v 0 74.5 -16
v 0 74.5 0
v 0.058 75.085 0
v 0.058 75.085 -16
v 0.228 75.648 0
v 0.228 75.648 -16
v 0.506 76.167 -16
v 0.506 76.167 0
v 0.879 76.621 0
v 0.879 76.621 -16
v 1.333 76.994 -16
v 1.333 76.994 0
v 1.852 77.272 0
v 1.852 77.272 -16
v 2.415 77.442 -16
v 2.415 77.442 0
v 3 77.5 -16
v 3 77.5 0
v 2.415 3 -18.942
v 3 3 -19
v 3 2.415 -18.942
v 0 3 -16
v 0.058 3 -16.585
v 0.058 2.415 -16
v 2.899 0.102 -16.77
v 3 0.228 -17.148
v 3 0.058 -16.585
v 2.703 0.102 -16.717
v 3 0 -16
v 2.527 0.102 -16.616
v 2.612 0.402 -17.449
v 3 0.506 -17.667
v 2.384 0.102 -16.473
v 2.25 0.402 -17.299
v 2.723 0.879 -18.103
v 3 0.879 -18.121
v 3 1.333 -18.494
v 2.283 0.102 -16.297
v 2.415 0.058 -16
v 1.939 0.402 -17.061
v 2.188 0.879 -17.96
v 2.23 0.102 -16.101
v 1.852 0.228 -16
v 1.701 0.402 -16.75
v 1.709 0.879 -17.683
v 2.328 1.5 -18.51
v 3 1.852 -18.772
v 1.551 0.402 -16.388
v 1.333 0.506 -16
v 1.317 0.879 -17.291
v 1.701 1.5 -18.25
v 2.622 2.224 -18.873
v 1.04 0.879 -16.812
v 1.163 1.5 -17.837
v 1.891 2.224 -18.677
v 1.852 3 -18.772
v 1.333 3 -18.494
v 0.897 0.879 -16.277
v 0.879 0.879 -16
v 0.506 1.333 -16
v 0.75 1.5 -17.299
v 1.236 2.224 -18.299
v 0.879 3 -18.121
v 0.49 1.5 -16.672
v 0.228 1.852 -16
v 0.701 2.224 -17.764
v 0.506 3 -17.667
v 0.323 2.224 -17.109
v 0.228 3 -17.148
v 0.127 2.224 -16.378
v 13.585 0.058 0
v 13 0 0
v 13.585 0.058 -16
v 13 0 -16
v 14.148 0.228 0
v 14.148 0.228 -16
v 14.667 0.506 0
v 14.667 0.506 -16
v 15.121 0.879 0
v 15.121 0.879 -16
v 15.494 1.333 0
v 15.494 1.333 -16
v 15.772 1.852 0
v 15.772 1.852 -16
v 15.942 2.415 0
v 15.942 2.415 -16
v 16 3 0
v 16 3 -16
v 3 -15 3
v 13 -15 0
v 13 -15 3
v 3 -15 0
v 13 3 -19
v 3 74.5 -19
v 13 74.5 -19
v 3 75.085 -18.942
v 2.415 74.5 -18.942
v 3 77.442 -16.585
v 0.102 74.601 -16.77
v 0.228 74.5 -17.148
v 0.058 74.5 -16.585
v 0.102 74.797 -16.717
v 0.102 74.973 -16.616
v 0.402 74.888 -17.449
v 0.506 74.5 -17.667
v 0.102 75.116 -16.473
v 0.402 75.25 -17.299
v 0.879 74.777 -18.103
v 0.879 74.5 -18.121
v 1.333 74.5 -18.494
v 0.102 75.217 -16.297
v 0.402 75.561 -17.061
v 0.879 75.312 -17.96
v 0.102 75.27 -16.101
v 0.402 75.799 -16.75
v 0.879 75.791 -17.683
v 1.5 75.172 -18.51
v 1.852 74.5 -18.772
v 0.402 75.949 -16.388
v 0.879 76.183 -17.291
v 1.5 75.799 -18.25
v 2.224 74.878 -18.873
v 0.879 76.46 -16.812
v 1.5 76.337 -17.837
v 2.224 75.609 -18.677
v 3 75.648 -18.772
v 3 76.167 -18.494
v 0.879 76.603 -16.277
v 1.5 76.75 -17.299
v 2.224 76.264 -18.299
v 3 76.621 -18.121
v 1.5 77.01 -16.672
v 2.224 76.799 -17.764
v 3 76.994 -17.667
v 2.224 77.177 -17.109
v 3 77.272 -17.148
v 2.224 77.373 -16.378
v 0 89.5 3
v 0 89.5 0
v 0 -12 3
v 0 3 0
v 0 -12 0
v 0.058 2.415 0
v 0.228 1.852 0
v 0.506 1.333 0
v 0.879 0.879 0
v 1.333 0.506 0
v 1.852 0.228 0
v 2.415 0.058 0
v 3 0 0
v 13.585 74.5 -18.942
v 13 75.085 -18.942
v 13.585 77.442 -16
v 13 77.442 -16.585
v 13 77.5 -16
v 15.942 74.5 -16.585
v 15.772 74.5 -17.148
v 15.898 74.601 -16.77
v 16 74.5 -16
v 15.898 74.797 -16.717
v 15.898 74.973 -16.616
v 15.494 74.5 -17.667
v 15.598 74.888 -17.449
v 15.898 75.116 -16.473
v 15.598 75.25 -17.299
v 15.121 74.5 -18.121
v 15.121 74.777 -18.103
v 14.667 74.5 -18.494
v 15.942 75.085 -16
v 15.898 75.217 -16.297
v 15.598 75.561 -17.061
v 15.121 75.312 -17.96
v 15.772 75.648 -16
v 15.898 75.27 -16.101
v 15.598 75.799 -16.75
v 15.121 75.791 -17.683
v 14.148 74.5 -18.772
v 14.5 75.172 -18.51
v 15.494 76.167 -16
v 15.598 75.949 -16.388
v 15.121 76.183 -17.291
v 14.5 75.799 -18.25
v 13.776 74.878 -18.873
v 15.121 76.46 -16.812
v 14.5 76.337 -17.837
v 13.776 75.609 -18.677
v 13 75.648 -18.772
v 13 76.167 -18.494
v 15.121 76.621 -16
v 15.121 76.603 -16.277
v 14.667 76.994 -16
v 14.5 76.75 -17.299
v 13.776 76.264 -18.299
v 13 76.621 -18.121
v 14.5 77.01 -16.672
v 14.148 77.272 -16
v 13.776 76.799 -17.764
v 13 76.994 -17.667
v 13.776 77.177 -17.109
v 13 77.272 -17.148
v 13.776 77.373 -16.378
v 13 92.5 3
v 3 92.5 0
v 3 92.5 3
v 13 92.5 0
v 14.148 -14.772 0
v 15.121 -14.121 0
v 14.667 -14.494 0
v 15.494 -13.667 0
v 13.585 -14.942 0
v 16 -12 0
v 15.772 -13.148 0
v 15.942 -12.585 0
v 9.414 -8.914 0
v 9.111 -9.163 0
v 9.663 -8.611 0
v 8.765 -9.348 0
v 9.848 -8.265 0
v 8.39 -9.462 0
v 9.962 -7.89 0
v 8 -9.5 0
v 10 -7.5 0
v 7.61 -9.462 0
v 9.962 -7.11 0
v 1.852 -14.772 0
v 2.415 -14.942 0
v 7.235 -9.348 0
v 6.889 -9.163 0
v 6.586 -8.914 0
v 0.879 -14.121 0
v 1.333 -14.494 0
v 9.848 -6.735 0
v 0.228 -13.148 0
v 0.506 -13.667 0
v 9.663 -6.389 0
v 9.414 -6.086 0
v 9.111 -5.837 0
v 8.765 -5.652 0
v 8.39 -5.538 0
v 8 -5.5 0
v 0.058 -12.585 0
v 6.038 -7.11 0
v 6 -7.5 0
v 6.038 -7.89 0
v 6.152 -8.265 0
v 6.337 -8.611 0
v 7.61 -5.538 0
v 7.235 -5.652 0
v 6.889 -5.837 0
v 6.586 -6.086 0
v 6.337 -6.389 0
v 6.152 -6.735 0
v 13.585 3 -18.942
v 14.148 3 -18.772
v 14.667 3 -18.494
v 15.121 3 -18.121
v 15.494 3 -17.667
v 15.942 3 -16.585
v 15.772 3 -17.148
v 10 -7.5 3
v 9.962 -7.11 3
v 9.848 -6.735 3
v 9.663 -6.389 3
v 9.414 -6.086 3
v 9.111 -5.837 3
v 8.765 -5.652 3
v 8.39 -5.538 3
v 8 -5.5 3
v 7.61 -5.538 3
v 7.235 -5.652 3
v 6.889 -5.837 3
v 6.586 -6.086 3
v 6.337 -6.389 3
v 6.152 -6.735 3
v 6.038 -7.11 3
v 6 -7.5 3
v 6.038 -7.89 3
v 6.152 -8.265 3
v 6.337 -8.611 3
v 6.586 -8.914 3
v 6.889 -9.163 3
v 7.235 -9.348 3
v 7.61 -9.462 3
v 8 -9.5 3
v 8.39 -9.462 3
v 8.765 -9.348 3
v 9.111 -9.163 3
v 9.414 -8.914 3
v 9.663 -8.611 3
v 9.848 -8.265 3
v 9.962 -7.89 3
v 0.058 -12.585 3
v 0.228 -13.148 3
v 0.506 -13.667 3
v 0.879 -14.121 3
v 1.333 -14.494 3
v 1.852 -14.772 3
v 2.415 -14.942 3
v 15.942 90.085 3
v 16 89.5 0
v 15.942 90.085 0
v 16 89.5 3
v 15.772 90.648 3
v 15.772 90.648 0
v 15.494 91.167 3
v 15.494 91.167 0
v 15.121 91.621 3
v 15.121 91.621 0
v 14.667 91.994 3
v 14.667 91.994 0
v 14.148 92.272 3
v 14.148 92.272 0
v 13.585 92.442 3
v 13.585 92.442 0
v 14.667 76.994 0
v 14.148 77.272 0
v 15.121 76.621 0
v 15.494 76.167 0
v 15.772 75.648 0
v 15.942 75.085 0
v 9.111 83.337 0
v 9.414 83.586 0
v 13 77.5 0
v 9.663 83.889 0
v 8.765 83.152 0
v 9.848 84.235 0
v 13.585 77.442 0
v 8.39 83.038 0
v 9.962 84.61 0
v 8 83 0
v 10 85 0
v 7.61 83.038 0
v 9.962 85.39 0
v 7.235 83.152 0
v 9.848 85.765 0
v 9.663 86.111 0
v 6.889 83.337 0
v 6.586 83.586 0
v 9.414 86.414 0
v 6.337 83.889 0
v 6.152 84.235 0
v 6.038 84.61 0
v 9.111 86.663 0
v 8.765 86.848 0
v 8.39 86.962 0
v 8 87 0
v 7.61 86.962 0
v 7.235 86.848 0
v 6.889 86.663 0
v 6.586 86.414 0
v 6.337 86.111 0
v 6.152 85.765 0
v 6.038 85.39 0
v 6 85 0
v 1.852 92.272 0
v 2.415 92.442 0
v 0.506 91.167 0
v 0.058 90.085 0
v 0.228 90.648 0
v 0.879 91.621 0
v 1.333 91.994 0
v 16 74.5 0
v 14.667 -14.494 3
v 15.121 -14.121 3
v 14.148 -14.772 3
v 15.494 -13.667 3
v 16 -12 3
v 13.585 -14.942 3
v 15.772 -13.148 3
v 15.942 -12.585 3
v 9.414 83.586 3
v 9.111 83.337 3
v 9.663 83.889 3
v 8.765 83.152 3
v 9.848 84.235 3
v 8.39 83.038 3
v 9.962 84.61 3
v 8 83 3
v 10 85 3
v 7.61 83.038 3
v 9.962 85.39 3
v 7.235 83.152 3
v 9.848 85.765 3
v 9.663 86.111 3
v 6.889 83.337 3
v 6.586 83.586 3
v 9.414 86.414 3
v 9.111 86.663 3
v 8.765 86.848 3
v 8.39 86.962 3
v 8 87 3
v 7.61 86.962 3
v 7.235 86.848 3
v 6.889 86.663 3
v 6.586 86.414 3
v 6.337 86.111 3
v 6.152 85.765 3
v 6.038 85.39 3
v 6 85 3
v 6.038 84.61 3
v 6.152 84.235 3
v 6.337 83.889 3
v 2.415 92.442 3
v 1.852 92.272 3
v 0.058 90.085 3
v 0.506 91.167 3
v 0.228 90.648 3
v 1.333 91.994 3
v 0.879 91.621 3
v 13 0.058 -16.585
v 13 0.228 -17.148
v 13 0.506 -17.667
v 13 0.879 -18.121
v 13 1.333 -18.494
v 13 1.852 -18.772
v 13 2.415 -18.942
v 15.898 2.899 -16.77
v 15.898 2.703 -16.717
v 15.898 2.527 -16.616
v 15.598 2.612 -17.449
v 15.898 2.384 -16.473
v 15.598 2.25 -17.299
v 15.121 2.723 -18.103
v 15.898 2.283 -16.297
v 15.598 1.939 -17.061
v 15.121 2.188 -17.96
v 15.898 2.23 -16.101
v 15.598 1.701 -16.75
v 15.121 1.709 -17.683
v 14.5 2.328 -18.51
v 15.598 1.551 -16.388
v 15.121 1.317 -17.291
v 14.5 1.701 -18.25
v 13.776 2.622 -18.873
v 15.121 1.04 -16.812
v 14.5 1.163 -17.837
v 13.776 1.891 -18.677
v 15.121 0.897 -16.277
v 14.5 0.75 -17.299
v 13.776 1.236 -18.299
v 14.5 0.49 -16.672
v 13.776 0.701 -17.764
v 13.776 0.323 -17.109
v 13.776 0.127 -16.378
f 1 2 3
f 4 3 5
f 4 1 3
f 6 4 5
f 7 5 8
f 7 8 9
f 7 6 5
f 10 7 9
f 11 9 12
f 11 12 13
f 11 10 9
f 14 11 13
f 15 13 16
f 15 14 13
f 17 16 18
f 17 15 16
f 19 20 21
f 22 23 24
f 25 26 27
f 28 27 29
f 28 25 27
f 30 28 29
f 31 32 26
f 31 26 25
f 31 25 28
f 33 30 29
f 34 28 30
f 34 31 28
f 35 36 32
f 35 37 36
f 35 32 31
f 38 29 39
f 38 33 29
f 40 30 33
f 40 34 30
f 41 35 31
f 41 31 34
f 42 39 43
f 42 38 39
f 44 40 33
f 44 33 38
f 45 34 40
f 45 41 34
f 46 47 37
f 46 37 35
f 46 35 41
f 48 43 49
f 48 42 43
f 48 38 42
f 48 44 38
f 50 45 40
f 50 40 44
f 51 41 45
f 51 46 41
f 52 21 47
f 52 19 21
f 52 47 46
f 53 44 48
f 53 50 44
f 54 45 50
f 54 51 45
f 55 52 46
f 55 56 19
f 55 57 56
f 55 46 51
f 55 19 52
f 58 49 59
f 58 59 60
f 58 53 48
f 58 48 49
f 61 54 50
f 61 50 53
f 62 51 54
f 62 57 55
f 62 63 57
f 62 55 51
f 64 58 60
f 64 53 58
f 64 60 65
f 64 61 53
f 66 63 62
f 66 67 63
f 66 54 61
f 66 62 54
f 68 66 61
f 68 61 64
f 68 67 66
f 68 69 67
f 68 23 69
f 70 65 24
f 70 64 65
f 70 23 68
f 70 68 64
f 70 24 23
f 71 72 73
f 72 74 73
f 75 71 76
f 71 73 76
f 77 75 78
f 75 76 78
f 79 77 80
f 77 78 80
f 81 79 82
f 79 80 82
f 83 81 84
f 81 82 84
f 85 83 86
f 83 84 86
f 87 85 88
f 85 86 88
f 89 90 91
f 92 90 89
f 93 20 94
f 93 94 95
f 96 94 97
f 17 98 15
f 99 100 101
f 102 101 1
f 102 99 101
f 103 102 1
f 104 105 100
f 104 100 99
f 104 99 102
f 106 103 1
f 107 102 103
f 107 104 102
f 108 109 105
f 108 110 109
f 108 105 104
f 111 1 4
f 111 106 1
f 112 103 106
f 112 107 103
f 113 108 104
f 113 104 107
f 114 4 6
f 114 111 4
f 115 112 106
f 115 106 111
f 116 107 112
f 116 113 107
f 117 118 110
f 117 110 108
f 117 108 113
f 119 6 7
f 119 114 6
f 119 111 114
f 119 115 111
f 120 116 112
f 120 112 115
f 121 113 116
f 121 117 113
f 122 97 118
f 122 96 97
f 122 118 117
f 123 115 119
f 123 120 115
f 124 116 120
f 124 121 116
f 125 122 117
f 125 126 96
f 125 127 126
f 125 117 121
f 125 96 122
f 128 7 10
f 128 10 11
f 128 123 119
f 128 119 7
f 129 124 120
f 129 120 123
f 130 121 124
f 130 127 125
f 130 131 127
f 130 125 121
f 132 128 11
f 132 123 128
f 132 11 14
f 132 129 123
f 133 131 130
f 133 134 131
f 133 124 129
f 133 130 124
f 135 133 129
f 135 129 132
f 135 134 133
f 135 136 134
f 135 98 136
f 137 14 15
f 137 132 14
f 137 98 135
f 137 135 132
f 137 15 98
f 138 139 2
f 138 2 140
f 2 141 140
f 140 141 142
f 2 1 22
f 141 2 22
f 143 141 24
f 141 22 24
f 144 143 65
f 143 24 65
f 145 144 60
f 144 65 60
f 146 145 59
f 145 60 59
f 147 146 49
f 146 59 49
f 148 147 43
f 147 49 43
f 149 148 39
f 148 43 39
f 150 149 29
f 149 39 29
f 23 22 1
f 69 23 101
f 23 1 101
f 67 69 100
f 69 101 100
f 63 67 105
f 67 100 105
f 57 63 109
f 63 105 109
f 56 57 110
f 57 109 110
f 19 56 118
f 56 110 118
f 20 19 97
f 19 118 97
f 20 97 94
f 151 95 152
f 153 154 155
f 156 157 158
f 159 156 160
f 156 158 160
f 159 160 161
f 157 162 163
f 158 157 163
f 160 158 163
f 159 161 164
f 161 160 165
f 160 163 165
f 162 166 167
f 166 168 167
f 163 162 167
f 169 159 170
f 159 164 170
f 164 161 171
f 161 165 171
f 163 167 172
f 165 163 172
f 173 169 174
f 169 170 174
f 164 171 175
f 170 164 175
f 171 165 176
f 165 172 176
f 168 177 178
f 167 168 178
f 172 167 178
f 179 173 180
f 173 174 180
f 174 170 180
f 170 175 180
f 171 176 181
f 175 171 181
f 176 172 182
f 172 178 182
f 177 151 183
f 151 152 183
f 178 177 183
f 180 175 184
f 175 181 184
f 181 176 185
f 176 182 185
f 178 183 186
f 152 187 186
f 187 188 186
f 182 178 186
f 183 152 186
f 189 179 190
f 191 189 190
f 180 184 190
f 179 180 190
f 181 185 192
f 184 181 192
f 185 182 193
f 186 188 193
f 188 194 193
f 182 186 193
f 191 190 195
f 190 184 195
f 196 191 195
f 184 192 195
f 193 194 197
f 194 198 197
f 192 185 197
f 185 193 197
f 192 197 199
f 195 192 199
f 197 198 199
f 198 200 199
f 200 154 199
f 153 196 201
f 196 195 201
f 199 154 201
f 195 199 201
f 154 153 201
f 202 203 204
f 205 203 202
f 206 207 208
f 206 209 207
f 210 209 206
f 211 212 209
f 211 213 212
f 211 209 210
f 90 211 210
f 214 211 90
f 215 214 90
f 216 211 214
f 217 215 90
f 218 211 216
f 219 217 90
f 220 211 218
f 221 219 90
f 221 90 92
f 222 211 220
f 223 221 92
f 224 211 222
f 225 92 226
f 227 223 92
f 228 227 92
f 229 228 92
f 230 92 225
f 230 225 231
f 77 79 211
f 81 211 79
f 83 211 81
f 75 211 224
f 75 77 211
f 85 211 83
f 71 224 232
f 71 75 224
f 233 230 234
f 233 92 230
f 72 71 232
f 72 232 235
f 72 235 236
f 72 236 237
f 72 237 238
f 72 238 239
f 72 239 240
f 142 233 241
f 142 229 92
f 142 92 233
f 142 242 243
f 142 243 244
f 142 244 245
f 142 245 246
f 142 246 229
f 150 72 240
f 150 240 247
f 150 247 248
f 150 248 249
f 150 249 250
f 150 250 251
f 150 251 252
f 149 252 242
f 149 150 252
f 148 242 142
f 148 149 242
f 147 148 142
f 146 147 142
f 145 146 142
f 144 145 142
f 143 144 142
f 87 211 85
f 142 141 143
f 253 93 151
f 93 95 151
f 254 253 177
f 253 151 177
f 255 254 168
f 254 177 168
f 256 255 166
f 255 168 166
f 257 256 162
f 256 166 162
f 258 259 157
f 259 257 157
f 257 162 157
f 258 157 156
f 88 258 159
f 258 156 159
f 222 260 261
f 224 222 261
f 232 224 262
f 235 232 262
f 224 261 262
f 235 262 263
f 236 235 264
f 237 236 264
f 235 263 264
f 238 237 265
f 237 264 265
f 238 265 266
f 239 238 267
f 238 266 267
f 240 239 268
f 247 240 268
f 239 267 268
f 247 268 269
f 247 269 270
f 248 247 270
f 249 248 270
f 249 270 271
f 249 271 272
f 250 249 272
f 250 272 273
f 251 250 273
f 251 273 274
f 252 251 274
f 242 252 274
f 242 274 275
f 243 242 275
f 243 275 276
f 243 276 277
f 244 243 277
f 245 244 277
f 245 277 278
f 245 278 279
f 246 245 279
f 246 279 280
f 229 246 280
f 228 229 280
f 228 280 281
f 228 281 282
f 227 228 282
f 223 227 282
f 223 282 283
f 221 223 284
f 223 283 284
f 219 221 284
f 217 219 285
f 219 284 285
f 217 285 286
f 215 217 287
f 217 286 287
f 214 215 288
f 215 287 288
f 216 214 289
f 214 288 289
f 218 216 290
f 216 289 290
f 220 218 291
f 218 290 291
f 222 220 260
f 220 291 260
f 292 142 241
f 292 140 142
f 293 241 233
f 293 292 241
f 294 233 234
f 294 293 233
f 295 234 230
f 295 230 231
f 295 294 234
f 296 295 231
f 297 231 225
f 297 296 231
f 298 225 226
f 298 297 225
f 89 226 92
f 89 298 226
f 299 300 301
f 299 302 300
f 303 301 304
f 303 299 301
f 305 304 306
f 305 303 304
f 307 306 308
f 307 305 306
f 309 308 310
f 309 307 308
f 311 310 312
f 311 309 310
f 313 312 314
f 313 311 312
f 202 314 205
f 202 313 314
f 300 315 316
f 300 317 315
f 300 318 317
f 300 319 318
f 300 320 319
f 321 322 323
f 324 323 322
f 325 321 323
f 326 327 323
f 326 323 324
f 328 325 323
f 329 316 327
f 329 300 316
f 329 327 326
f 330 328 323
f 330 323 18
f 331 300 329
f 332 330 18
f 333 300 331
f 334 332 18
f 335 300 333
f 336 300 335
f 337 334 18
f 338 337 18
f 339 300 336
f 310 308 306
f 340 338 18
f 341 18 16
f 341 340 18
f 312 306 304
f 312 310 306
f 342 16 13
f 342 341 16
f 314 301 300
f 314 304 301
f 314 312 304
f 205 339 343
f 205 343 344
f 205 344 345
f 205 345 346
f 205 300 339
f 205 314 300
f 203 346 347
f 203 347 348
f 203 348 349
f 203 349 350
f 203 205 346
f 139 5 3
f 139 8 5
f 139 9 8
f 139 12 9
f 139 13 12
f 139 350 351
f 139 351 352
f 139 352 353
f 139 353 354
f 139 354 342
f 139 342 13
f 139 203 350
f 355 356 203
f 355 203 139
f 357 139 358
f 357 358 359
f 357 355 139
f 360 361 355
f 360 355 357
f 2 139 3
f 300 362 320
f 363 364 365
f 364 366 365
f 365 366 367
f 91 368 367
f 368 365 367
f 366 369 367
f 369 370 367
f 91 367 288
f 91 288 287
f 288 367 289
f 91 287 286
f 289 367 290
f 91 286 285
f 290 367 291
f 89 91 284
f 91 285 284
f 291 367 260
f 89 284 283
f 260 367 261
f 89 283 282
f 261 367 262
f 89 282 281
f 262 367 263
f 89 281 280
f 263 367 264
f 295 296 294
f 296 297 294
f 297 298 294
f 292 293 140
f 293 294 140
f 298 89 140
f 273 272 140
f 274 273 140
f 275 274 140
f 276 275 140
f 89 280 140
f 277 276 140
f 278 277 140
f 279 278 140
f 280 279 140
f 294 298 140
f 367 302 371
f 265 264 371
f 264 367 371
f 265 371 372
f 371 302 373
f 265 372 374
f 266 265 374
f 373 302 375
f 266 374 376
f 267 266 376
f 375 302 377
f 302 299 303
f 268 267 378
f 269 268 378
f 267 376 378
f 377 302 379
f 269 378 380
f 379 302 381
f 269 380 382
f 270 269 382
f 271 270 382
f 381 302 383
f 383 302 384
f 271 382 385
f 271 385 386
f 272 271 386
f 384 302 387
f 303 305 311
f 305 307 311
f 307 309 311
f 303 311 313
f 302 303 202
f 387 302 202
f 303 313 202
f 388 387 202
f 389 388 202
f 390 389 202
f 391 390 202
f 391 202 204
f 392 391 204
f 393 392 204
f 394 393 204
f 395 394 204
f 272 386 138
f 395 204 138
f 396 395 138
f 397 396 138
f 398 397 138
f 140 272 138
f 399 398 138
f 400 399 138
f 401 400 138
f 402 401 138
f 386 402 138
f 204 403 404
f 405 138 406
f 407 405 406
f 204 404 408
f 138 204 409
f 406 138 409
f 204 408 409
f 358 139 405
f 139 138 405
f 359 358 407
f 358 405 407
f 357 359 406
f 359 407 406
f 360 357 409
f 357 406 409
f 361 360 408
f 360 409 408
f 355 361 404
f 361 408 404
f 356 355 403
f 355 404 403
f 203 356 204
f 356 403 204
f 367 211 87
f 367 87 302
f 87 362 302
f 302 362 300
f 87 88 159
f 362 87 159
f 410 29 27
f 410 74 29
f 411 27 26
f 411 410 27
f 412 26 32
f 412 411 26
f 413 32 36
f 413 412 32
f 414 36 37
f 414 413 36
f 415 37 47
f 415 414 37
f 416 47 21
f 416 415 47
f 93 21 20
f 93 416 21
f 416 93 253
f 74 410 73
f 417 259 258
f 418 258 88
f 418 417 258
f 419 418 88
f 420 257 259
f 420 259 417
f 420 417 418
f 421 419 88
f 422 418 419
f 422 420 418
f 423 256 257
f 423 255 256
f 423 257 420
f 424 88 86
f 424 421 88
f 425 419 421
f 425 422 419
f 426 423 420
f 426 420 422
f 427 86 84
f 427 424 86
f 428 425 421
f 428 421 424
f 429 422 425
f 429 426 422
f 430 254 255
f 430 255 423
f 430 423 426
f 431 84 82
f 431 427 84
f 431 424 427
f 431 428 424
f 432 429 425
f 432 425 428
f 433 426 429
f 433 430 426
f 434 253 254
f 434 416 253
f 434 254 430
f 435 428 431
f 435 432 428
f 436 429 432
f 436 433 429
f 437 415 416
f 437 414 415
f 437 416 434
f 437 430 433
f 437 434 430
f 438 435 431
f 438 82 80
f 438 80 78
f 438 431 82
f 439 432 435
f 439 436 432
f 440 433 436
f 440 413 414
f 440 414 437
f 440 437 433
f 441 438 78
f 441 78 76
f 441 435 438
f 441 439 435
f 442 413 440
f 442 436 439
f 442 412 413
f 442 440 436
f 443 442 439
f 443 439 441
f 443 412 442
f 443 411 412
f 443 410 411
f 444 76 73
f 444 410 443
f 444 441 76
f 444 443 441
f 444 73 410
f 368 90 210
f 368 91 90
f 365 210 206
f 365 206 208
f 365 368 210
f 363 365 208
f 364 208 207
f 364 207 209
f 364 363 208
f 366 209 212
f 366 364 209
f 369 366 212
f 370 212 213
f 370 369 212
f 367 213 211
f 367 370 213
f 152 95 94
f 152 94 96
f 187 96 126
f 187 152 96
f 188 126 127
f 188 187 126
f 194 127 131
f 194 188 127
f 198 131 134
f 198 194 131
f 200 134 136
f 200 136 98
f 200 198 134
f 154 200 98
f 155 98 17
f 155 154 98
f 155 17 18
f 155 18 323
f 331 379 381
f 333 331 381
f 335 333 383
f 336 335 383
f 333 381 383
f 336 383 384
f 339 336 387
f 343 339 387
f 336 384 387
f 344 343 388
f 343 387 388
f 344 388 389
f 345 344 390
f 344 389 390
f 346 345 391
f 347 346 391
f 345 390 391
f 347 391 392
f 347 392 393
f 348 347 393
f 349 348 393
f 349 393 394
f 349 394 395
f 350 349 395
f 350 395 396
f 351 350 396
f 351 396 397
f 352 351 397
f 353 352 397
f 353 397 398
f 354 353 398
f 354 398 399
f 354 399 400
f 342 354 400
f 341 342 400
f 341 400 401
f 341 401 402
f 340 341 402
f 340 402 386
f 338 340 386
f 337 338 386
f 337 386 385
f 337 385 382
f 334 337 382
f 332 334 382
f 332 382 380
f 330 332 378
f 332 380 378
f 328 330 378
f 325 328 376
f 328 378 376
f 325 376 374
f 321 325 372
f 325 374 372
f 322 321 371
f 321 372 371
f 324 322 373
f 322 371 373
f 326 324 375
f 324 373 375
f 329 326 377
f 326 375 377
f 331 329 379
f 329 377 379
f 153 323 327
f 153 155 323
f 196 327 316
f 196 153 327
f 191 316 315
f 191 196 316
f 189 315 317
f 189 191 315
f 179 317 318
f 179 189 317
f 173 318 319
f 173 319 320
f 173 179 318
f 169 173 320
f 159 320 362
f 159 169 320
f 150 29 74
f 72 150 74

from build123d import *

# Parameters (mm, degrees)
SKETCH2_W           = 16
SKETCH2_H           = 77.5
BOSS_EXTRUDE1_DEPTH = 19
BOSS_EXTRUDE2_DEPTH = 3
SKETCH4_R           = 2
CUT_EXTRUDE1_DEPTH  = 23
FILLET1_R           = 3
FILLET2_R           = 3


with BuildPart() as part:
    # Sketch2 → Boss-Extrude1 (new body)
    with BuildSketch(Plane.XY):
        with Locations((8, 38.75)):
            Rectangle(SKETCH2_W, SKETCH2_H)
    extrude(amount=-BOSS_EXTRUDE1_DEPTH)

    # Sketch3 → Boss-Extrude2 (add)
    with BuildSketch(Plane.XY):
        Polygon((0, 77.5), (0, 92.5), (16, 92.5), (16, 0), (16, -15), (0, -15), align=None)
    extrude(amount=BOSS_EXTRUDE2_DEPTH)

    # Sketch4 → Cut-Extrude1 (cut, through all)
    with BuildSketch(Plane.XY.offset(3)):
        with Locations((8, 85)):
            Circle(SKETCH4_R)
        with Locations((8, -7.5)):
            Circle(SKETCH4_R)
    extrude(amount=-CUT_EXTRUDE1_DEPTH, mode=Mode.SUBTRACT)

    # Fillet1
    fillet1_edges = [part.edges().sort_by_distance(p)[0] for p in [
        (8, 77.5, -19),
        (0, 38.75, -19),
        (8, 0, -19),
        (16, 38.75, -19),
        (0, 0, -9.5),
        (0, 77.5, -9.5),
        (16, 77.5, -9.5),
        (16, 0, -9.5),
    ]]
    fillet(fillet1_edges, radius=FILLET1_R)

    # Fillet2
    fillet2_edges = [part.edges().sort_by_distance(p)[0] for p in [
        (0, -15, 1.5),
        (16, -15, 1.5),
        (16, 92.5, 1.5),
        (0, 92.5, 1.5),
    ]]
    fillet(fillet2_edges, radius=FILLET2_R)


solid = part.part
